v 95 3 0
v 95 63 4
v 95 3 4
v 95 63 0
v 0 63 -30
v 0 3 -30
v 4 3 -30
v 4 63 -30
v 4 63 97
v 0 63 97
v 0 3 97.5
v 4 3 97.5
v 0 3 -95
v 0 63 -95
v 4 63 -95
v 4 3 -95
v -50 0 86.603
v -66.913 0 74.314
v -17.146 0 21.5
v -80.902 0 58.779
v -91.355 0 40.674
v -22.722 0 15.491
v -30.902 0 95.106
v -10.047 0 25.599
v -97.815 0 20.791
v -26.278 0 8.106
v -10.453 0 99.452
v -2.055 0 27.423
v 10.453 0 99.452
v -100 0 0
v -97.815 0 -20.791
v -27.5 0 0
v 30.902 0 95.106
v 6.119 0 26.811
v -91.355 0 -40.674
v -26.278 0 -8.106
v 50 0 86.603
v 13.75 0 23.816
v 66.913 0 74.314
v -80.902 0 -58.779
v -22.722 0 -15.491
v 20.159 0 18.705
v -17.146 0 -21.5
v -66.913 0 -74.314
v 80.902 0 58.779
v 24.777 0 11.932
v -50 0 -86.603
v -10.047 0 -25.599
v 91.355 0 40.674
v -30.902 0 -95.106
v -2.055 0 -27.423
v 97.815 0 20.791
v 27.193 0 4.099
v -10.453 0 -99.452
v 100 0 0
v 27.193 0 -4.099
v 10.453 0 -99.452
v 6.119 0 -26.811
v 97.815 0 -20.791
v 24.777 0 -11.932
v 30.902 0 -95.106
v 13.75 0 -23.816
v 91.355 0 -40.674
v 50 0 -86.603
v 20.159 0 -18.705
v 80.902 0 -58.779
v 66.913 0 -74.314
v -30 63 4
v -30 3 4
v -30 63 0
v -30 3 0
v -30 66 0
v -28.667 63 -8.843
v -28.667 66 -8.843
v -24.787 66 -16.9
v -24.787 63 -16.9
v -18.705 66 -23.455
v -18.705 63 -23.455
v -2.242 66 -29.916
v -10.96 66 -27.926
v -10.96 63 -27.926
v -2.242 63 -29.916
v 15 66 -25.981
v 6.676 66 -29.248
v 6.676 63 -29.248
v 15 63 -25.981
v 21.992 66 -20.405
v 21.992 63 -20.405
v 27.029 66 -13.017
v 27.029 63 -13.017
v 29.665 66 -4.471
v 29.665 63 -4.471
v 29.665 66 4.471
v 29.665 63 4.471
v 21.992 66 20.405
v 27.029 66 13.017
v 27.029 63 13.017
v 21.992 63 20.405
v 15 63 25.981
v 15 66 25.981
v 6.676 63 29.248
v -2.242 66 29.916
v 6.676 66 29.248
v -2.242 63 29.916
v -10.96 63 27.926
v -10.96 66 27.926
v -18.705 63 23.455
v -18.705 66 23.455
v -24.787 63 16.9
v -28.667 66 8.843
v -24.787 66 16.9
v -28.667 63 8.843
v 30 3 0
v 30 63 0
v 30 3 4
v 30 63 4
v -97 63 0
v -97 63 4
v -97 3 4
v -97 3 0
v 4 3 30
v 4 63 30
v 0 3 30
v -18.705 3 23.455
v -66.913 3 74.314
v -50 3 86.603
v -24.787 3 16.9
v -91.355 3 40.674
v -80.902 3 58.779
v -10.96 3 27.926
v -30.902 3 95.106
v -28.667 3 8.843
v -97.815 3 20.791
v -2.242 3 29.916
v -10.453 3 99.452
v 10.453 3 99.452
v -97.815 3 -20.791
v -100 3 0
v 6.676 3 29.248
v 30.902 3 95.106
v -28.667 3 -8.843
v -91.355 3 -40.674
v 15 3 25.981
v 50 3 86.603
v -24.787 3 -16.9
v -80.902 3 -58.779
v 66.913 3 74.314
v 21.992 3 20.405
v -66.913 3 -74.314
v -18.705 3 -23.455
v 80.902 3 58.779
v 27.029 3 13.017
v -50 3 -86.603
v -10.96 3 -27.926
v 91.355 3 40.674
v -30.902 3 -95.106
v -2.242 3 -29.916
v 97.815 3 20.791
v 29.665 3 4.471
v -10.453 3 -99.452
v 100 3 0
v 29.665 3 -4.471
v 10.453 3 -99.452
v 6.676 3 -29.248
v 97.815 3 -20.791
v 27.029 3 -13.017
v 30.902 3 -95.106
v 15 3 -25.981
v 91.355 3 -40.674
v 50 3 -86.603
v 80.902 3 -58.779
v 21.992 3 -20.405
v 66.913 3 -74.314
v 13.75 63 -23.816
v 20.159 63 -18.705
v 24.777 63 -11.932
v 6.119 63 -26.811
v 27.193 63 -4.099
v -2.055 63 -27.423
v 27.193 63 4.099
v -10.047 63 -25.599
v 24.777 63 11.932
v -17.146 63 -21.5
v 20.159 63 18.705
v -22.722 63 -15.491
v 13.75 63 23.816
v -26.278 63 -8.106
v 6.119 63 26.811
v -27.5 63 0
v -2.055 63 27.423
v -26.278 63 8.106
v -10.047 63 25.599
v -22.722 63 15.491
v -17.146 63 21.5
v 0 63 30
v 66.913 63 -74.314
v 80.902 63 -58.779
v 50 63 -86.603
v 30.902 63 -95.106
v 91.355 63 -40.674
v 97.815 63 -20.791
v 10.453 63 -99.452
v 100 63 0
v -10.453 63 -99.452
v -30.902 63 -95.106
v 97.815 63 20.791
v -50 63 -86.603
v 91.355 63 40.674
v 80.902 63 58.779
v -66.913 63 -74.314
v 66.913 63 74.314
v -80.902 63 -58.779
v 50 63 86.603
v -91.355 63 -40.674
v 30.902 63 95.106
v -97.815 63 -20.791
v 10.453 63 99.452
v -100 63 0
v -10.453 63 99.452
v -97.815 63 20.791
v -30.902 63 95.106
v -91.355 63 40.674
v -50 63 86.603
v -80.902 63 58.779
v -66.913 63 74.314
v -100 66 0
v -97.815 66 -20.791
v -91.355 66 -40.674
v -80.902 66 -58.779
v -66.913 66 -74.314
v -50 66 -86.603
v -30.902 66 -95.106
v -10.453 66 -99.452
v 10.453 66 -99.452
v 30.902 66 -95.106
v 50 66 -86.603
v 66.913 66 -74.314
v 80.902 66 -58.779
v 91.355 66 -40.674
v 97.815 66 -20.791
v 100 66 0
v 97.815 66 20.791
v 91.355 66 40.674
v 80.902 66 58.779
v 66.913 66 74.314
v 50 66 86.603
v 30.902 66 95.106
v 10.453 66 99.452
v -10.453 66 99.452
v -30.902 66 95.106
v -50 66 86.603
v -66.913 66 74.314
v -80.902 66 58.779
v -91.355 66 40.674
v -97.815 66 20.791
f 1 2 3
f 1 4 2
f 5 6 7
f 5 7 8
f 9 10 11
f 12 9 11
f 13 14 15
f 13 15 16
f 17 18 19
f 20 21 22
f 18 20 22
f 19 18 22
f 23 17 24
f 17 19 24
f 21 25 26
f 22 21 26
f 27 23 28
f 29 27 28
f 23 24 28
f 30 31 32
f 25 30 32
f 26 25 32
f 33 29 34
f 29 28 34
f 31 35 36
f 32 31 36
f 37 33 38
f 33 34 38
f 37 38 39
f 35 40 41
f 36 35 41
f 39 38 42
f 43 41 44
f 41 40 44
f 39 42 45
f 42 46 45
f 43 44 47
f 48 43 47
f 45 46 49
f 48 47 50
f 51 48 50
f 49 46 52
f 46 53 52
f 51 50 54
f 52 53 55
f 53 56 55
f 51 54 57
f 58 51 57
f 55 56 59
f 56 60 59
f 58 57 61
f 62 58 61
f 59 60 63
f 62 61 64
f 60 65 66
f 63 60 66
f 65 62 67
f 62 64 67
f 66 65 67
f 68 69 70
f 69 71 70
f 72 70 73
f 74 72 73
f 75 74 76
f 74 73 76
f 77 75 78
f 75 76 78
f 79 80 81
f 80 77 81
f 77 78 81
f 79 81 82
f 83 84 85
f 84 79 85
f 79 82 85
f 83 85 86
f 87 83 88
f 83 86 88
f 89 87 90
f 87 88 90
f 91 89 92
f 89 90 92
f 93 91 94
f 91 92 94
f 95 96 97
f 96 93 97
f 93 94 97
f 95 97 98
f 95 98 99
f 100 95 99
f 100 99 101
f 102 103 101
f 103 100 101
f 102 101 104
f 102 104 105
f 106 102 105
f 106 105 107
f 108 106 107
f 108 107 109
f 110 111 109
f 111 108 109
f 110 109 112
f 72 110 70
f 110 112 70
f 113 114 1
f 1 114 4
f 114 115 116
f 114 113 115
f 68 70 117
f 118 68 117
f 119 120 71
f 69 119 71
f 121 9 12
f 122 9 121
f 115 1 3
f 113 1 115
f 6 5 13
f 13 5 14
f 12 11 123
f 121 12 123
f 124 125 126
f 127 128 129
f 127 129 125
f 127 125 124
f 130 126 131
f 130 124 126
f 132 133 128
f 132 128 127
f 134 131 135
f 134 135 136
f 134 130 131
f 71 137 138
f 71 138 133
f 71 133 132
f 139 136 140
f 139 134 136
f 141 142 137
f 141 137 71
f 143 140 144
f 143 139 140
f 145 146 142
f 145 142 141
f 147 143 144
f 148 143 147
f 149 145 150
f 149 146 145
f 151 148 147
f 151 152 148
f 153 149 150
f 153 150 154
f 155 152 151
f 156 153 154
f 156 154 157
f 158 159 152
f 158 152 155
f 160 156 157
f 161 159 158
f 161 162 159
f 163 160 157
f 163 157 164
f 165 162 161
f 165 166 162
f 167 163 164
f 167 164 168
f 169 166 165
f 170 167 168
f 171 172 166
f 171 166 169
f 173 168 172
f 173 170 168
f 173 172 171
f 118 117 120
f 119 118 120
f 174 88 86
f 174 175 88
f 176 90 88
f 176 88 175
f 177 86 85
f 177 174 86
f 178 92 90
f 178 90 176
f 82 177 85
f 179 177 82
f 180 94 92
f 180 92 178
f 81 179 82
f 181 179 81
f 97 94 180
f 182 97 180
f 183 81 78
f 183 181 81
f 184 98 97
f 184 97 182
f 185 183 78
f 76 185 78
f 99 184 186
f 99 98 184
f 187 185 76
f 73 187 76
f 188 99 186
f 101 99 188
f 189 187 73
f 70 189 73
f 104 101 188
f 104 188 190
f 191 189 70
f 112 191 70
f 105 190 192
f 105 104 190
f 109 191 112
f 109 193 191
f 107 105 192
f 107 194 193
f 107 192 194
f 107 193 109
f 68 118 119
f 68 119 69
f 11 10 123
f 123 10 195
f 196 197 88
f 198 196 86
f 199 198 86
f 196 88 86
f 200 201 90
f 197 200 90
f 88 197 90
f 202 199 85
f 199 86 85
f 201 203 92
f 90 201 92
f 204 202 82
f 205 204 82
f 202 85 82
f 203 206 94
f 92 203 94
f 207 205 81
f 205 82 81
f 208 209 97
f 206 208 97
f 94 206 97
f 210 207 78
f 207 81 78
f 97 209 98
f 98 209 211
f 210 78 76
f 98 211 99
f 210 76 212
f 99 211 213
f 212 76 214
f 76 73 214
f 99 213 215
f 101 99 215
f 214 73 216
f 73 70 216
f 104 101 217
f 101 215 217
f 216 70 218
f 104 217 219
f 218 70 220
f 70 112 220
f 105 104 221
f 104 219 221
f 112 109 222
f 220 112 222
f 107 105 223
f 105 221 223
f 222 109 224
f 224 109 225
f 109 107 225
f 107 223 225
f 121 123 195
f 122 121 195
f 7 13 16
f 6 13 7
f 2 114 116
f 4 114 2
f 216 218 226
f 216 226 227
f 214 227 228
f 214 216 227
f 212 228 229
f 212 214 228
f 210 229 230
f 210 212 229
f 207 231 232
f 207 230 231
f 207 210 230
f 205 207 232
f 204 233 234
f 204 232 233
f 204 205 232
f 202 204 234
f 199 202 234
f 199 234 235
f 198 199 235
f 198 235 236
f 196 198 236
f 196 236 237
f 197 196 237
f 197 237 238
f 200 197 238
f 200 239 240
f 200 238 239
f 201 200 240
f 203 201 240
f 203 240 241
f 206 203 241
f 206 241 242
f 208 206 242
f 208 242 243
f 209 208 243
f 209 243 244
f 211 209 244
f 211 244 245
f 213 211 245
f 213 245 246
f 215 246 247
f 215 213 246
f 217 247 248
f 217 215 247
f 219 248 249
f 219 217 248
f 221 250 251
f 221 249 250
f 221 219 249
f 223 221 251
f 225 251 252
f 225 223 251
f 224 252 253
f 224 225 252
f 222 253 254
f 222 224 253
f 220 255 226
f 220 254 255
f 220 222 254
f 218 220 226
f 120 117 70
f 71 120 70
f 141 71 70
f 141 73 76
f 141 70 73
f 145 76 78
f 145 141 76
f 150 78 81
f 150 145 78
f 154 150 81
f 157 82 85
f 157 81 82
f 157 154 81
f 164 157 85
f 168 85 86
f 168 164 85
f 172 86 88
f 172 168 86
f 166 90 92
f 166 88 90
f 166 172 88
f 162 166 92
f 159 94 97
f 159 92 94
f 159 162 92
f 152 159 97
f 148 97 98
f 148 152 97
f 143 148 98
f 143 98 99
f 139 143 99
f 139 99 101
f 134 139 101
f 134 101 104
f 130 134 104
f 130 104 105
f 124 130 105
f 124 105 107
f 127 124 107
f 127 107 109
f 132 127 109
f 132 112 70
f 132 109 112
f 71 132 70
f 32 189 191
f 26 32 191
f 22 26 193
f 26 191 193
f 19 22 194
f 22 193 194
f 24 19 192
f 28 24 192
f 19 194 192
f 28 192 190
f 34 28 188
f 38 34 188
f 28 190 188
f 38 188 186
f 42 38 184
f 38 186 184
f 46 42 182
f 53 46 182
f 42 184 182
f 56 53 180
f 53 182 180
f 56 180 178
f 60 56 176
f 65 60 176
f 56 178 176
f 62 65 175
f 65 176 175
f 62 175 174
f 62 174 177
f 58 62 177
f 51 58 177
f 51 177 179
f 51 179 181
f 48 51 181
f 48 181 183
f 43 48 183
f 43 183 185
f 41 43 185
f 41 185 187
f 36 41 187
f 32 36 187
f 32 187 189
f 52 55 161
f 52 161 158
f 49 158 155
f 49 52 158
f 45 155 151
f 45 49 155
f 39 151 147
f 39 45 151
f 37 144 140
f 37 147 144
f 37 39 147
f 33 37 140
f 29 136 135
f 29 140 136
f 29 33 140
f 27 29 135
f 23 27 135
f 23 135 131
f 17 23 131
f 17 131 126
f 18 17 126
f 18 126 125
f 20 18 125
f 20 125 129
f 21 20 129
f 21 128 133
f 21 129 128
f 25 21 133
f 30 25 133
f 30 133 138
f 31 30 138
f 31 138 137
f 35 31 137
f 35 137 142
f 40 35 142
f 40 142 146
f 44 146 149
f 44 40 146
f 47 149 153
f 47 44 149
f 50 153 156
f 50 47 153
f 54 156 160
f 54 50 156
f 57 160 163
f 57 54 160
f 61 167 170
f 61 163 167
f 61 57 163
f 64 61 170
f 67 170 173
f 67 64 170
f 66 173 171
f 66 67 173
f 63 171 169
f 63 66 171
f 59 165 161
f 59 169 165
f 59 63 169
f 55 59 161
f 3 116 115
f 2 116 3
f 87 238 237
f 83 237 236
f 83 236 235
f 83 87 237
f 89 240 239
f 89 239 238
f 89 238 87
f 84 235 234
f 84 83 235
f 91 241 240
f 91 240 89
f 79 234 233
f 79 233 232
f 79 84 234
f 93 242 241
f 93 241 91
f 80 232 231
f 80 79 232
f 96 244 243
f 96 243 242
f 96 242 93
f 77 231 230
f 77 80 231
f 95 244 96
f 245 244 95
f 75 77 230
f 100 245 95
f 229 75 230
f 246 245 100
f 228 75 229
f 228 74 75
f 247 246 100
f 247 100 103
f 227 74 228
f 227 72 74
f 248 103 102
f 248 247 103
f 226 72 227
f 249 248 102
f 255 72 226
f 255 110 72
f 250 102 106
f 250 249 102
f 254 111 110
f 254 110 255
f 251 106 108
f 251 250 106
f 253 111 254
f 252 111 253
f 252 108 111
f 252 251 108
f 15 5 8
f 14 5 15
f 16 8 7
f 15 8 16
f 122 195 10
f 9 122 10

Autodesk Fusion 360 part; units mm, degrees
sketch "Sketch1" plane through (0, 0, 0) normal (0, 1, 0) x (1, 0, 0)
  circle A0 centre (0, 0) radius 100
  dimension "d1" = 200
extrude "Extrude1" add sketch "Sketch1" along normal blind 1 makes body 1
extrude "Extrude2" add 1 faces at (-27.1036, 1, 4.9681) along direction (0, 1, 0) blind 2 on bodies 1 bodies 1
sketch "Sketch2" plane through (0, 3, 0) normal (0, 1, 0) x (-1, 0, 0)
  circle A0 centre (0, 0) radius 100
  circle A1 centre (0, 0) radius 30
  dimension "d6" = 60
extrude "Extrude3" add sketch "Sketch2" along normal blind 60 contours A1 bodies 1
sketch "Sketch3" plane through (0, 63, 0) normal (0, 1, 0) x (-1, 0, 0)
  circle A0 centre (0, 0) radius 30
  circle A1 centre (0, 0) radius 100
  circle A2 centre (0, 0) radius 27.5
  dimension "d9" = 200
  dimension "d10" = 55
extrude "Extrude4" cut sketch "Sketch3" against normal blind 80 contours A2 bodies 1
sketch "Sketch4" plane through (0, 0, 0) normal (0, 1, 0) x (1, 0, 0)
sketch "Sketch5" plane through (0, 63, 0) normal (0, 1, 0) x (-1, 0, 0)
  circle A0 centre (0, 0) radius 27.5
  circle A1 centre (0, 0) radius 30
  circle A2 centre (0, 0) radius 100
  dimension "d13" = 200
extrude "Extrude5" add sketch "Sketch5" along normal blind 3 separate body contours A2 makes body 2
combine "Combine1" operation add target body 2 tool bodies 1
sketch "Sketch6" plane through (0, 0, 0) normal (0, 0, 1) x (1, 0, 0)
  line L0 (30, 63) -> (95, 63)
  line L1 (95, 63) -> (95, 3)
  line L2 (95, 3) -> (30, 3)
  line L3 (30, 3) -> (30, 63)
extrude "Extrude6" add sketch "Sketch6" along normal blind 4 separate body makes body 3
sketch "Sketch7" plane through (0, 0, 0) normal (1, 0, 0) x (0, 0, -1)
  line L0 (30, 63) -> (95, 63)
  line L1 (95, 63) -> (95, 3)
  line L2 (95, 3) -> (30, 3)
  line L3 (30, 3) -> (30, 63)
extrude "Extrude7" add sketch "Sketch7" along normal blind 4 separate body makes body 4
sketch "Sketch8" plane through (0, 0, 0) normal (0, 0, 1) x (1, 0, 0)
  line L0 (-30, 63) -> (-97, 63)
  line L1 (-97, 63) -> (-97, 3)
  line L2 (-97, 3) -> (-30, 3)
  line L3 (-30, 3) -> (-30, 63)
extrude "Extrude8" add sketch "Sketch8" along normal blind 4 separate body makes body 5
sketch "Sketch9" plane through (0, 0, 0) normal (1, 0, 0) x (0, 0, -1)
  line L0 (-30, 63) -> (-97, 63)
  line L1 (-97, 63) -> (-97.5, 3)
  line L2 (-97.5, 3) -> (-30, 3)
  line L3 (-30, 3) -> (-30, 63)
extrude "Extrude9" add sketch "Sketch9" along normal blind 4 separate body makes body 6
sketch "Sketch10" plane through (0, 0, 0) normal (-1, 0, 0) x (0, 0, 1)
  line L0 (30, 63) -> (30, 3)
  line L1 (30, 3) -> (97.5, 3)
  line L2 (97.5, 3) -> (97, 63)
  line L3 (97, 63) -> (30, 63)
